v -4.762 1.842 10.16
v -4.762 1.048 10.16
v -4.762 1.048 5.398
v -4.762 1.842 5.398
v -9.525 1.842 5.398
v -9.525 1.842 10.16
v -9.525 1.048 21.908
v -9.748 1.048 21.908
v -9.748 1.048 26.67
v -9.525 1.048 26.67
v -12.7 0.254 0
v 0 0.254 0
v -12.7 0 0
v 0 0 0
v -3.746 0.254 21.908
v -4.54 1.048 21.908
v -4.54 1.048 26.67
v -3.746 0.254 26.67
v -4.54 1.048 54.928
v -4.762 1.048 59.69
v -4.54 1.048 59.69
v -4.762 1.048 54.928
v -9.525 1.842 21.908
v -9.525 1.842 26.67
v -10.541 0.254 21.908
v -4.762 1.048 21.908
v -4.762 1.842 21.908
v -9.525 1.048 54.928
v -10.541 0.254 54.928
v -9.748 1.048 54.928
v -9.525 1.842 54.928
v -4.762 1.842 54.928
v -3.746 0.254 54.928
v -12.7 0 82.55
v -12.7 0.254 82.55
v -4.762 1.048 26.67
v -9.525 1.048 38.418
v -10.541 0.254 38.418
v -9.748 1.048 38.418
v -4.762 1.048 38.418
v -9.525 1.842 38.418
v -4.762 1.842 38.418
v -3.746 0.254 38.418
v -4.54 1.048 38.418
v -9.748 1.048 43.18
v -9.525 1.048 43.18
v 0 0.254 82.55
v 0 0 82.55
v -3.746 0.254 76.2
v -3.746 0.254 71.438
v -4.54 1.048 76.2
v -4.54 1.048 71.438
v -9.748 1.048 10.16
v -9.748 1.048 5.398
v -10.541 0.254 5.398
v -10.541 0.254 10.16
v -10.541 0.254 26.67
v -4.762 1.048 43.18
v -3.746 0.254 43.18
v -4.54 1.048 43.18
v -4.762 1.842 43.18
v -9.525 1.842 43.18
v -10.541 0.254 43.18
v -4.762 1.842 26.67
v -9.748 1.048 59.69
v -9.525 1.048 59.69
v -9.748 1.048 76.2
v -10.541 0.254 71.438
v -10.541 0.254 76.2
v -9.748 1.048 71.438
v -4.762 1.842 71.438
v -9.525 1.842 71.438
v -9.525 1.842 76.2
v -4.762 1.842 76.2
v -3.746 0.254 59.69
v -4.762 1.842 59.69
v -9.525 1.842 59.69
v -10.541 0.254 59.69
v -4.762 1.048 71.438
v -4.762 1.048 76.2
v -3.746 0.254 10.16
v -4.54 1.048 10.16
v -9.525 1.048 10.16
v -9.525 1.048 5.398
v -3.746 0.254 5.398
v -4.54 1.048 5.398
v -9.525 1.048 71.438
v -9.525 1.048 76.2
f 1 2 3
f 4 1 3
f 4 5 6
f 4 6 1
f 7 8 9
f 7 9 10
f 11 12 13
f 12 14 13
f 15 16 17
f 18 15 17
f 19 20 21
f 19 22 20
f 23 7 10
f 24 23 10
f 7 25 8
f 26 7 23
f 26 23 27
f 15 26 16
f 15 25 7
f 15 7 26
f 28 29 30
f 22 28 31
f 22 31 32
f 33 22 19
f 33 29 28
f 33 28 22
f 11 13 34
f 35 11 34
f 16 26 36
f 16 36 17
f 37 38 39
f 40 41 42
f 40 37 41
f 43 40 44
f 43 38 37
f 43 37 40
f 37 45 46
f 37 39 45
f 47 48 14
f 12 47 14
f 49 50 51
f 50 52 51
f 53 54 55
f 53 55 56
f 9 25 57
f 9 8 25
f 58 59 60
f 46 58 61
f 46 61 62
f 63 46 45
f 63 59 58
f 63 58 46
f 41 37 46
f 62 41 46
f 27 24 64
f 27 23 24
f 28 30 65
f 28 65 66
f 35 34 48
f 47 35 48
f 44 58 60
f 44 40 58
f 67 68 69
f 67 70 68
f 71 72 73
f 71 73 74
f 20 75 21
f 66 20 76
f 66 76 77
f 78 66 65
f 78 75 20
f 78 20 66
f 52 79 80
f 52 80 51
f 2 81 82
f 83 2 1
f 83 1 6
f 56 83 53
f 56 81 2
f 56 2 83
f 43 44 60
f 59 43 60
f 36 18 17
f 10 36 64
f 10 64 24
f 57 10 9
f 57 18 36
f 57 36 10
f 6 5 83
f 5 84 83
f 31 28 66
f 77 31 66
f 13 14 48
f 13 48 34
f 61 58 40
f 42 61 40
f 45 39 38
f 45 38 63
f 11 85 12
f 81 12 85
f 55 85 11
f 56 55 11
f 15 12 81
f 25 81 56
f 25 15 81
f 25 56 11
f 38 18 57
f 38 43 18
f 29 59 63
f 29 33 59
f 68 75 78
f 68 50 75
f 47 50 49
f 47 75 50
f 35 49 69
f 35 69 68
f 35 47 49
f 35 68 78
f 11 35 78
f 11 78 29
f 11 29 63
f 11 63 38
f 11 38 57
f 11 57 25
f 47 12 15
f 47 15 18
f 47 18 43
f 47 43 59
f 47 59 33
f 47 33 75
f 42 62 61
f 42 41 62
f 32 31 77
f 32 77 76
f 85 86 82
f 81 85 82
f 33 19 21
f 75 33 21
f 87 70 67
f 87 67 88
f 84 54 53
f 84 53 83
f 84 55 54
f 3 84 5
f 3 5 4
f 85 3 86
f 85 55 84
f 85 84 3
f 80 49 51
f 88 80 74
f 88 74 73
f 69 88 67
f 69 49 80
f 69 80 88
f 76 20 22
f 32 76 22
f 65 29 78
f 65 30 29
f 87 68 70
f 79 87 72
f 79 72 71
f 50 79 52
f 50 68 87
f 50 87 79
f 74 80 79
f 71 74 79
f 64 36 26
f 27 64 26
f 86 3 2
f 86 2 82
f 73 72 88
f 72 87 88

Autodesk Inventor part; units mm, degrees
ref_plane "YZ Plane" through (0, 0, 0) normal (1, 0, 0) x (0, 1, 0)
ref_plane "XZ Plane" through (0, 0, 0) normal (0, 1, 0) x (-1, 0, 0)
ref_plane "XY Plane" through (0, 0, 0) normal (0, 0, 1) x (1, 0, 0)
sketch "Sketch1" plane through (0, 0, 0) normal (0, 1, 0) x (-1, 0, 0)
  line L0 (0, 0) -> (12.7, 0)
  line L1 (12.7, 0) -> (12.7, 82.55)
  line L2 (12.7, 82.55) -> (0, 82.55)
  line L3 (0, 82.55) -> (0, 0)
  dimension "d0" = 12.7
  dimension "d1" = 82.55
extrude "Extrusion1" add sketch "Sketch1" along normal blind 0.254
sketch "Sketch2" plane through (0, 0.254, 0) normal (0, 1, 0) x (1, 0, 0)
  line L0 (-9.525, -76.2) -> (-4.7625, -76.2)
  line L1 (-4.7625, -76.2) -> (-4.7625, -71.4375)
  line L2 (-4.7625, -71.4375) -> (-9.525, -71.4375)
  line L3 (-9.525, -71.4375) -> (-9.525, -76.2)
  line L4 (-12.7, -82.55) -> (0, -82.55) projected
  line L5 (-12.7, 0) -> (-12.7, -82.55) projected
  line L6 (-9.525, -59.69) -> (-4.7625, -59.69)
  line L7 (-4.7625, -59.69) -> (-4.7625, -54.9275)
  line L8 (-4.7625, -54.9275) -> (-9.525, -54.9275)
  line L9 (-9.525, -54.9275) -> (-9.525, -59.69)
  line L10 (-9.525, -43.18) -> (-4.7625, -43.18)
  line L11 (-4.7625, -43.18) -> (-4.7625, -38.4175)
  line L12 (-4.7625, -38.4175) -> (-9.525, -38.4175)
  line L13 (-9.525, -38.4175) -> (-9.525, -43.18)
  line L14 (-9.525, -26.67) -> (-4.7625, -26.67)
  line L15 (-4.7625, -26.67) -> (-4.7625, -21.9075)
  line L16 (-4.7625, -21.9075) -> (-9.525, -21.9075)
  line L17 (-9.525, -21.9075) -> (-9.525, -26.67)
  line L18 (-9.525, -10.16) -> (-4.7625, -10.16)
  line L19 (-4.7625, -10.16) -> (-4.7625, -5.3975)
  line L20 (-4.7625, -5.3975) -> (-9.525, -5.3975)
  line L21 (-9.525, -5.3975) -> (-9.525, -10.16)
  line L22 (-4.7625, -59.69) -> (-3.7465, -59.69)
  line L23 (-3.7465, -59.69) -> (-3.7465, -54.9275)
  line L24 (-3.7465, -54.9275) -> (-4.7625, -54.9275)
  line L25 (-4.7625, -54.9275) -> (-4.7625, -59.69)
  line L26 (-4.7625, -76.2) -> (-3.7465, -76.2)
  line L27 (-3.7465, -76.2) -> (-3.7465, -71.4375)
  line L28 (-3.7465, -71.4375) -> (-4.7625, -71.4375)
  line L29 (-4.7625, -71.4375) -> (-4.7625, -76.2)
  line L30 (-9.525, -76.2) -> (-10.541, -76.2)
  line L31 (-10.541, -76.2) -> (-10.541, -71.4375)
  line L32 (-10.541, -71.4375) -> (-9.525, -71.4375)
  line L33 (-9.525, -71.4375) -> (-9.525, -76.2)
  line L34 (-9.525, -59.69) -> (-10.541, -59.69)
  line L35 (-10.541, -59.69) -> (-10.541, -54.9275)
  line L36 (-10.541, -54.9275) -> (-9.525, -54.9275)
  line L37 (-9.525, -54.9275) -> (-9.525, -59.69)
  line L38 (-9.525, -43.18) -> (-10.541, -43.18)
  line L39 (-10.541, -43.18) -> (-10.541, -38.4175)
  line L40 (-10.541, -38.4175) -> (-9.525, -38.4175)
  line L41 (-9.525, -38.4175) -> (-9.525, -43.18)
  line L42 (-4.7625, -43.18) -> (-3.7465, -43.18)
  line L43 (-3.7465, -43.18) -> (-3.7465, -38.4175)
  line L44 (-3.7465, -38.4175) -> (-4.7625, -38.4175)
  line L45 (-4.7625, -38.4175) -> (-4.7625, -43.18)
  line L46 (-4.7625, -26.67) -> (-3.7465, -26.67)
  line L47 (-3.7465, -26.67) -> (-3.7465, -21.9075)
  line L48 (-3.7465, -21.9075) -> (-4.7625, -21.9075)
  line L49 (-4.7625, -21.9075) -> (-4.7625, -26.67)
  line L50 (-9.525, -26.67) -> (-10.541, -26.67)
  line L51 (-10.541, -26.67) -> (-10.541, -21.9075)
  line L52 (-10.541, -21.9075) -> (-9.525, -21.9075)
  line L53 (-9.525, -21.9075) -> (-9.525, -26.67)
  line L54 (-9.525, -10.16) -> (-10.541, -10.16)
  line L55 (-10.541, -10.16) -> (-10.541, -5.3975)
  line L56 (-10.541, -5.3975) -> (-9.525, -5.3975)
  line L57 (-9.525, -5.3975) -> (-9.525, -10.16)
  line L58 (-4.7625, -10.16) -> (-3.7465, -10.16)
  line L59 (-3.7465, -10.16) -> (-3.7465, -5.3975)
  line L60 (-3.7465, -5.3975) -> (-4.7625, -5.3975)
  line L61 (-4.7625, -5.3975) -> (-4.7625, -10.16)
  point P0 (0, 0)
  point P1 (-4.7625, -21.9075)
  point P2 (-4.7625, -54.9275)
  dimension "d4" = 4.7625
  dimension "d5" = 4.7625
  dimension "d6" = 6.35
  dimension "d7" = 3.175
  dimension "d8" = 4.7625
  dimension "d9" = 4.7625
  dimension "d10" = 11.7475
  dimension "d11" = 3.175
  dimension "d12" = 4.7625
  dimension "d13" = 4.7625
  dimension "d14" = 4.7625
  dimension "d15" = 4.7625
  dimension "d16" = 4.7625
  dimension "d17" = 4.7625
  dimension "d18" = 11.7475
  dimension "d19" = 11.7475
  dimension "d20" = 11.7475
  dimension "d21" = 3.175
  dimension "d22" = 1.016
  dimension "d23" = 1.016
  dimension "d31" = 4.7625
  dimension "d32" = 4.7625
  dimension "d33" = 4.7625
  dimension "d34" = 4.7625
extrude "Extrusion2" add sketch "Sketch2" along normal blind 1.5875 contours L3 L2 L1 L0 | L9 L8 L7 L6 | L13 L12 L11 L10 | L17 L16 L15 L14 | L21 L20 L19 L18
extrude "Extrusion3" add sketch "Sketch2" along normal blind 0.7937 contours L30 L31 L32 L3 | L1 L28 L27 L26 | L34 L35 L36 L9 | L7 L24 L23 L22 | L38 L39 L40 L13 | L11 L44 L43 L42 | L50 L51 L52 L17 | L15 L48 L47 L46 | L54 L55 L56 L21 | L19 L60 L59 L58
chamfer "Chamfer1" distance 0.7937 angle 45 10 edges at (-3.7465, 1.0477, 73.8188) (-3.7465, 1.0477, 57.3088) (-3.7465, 1.0477, 40.7988) (-3.7465, 1.0477, 24.2888) (-3.7465, 1.0477, 7.7787) (-10.541, 1.0477, 7.7787) (-10.541, 1.0477, 24.2888) (-10.541, 1.0477, 40.7988) (-10.541, 1.0477, 57.3088) (-10.541, 1.0477, 73.8188)
properties part number "LED_Strip"
